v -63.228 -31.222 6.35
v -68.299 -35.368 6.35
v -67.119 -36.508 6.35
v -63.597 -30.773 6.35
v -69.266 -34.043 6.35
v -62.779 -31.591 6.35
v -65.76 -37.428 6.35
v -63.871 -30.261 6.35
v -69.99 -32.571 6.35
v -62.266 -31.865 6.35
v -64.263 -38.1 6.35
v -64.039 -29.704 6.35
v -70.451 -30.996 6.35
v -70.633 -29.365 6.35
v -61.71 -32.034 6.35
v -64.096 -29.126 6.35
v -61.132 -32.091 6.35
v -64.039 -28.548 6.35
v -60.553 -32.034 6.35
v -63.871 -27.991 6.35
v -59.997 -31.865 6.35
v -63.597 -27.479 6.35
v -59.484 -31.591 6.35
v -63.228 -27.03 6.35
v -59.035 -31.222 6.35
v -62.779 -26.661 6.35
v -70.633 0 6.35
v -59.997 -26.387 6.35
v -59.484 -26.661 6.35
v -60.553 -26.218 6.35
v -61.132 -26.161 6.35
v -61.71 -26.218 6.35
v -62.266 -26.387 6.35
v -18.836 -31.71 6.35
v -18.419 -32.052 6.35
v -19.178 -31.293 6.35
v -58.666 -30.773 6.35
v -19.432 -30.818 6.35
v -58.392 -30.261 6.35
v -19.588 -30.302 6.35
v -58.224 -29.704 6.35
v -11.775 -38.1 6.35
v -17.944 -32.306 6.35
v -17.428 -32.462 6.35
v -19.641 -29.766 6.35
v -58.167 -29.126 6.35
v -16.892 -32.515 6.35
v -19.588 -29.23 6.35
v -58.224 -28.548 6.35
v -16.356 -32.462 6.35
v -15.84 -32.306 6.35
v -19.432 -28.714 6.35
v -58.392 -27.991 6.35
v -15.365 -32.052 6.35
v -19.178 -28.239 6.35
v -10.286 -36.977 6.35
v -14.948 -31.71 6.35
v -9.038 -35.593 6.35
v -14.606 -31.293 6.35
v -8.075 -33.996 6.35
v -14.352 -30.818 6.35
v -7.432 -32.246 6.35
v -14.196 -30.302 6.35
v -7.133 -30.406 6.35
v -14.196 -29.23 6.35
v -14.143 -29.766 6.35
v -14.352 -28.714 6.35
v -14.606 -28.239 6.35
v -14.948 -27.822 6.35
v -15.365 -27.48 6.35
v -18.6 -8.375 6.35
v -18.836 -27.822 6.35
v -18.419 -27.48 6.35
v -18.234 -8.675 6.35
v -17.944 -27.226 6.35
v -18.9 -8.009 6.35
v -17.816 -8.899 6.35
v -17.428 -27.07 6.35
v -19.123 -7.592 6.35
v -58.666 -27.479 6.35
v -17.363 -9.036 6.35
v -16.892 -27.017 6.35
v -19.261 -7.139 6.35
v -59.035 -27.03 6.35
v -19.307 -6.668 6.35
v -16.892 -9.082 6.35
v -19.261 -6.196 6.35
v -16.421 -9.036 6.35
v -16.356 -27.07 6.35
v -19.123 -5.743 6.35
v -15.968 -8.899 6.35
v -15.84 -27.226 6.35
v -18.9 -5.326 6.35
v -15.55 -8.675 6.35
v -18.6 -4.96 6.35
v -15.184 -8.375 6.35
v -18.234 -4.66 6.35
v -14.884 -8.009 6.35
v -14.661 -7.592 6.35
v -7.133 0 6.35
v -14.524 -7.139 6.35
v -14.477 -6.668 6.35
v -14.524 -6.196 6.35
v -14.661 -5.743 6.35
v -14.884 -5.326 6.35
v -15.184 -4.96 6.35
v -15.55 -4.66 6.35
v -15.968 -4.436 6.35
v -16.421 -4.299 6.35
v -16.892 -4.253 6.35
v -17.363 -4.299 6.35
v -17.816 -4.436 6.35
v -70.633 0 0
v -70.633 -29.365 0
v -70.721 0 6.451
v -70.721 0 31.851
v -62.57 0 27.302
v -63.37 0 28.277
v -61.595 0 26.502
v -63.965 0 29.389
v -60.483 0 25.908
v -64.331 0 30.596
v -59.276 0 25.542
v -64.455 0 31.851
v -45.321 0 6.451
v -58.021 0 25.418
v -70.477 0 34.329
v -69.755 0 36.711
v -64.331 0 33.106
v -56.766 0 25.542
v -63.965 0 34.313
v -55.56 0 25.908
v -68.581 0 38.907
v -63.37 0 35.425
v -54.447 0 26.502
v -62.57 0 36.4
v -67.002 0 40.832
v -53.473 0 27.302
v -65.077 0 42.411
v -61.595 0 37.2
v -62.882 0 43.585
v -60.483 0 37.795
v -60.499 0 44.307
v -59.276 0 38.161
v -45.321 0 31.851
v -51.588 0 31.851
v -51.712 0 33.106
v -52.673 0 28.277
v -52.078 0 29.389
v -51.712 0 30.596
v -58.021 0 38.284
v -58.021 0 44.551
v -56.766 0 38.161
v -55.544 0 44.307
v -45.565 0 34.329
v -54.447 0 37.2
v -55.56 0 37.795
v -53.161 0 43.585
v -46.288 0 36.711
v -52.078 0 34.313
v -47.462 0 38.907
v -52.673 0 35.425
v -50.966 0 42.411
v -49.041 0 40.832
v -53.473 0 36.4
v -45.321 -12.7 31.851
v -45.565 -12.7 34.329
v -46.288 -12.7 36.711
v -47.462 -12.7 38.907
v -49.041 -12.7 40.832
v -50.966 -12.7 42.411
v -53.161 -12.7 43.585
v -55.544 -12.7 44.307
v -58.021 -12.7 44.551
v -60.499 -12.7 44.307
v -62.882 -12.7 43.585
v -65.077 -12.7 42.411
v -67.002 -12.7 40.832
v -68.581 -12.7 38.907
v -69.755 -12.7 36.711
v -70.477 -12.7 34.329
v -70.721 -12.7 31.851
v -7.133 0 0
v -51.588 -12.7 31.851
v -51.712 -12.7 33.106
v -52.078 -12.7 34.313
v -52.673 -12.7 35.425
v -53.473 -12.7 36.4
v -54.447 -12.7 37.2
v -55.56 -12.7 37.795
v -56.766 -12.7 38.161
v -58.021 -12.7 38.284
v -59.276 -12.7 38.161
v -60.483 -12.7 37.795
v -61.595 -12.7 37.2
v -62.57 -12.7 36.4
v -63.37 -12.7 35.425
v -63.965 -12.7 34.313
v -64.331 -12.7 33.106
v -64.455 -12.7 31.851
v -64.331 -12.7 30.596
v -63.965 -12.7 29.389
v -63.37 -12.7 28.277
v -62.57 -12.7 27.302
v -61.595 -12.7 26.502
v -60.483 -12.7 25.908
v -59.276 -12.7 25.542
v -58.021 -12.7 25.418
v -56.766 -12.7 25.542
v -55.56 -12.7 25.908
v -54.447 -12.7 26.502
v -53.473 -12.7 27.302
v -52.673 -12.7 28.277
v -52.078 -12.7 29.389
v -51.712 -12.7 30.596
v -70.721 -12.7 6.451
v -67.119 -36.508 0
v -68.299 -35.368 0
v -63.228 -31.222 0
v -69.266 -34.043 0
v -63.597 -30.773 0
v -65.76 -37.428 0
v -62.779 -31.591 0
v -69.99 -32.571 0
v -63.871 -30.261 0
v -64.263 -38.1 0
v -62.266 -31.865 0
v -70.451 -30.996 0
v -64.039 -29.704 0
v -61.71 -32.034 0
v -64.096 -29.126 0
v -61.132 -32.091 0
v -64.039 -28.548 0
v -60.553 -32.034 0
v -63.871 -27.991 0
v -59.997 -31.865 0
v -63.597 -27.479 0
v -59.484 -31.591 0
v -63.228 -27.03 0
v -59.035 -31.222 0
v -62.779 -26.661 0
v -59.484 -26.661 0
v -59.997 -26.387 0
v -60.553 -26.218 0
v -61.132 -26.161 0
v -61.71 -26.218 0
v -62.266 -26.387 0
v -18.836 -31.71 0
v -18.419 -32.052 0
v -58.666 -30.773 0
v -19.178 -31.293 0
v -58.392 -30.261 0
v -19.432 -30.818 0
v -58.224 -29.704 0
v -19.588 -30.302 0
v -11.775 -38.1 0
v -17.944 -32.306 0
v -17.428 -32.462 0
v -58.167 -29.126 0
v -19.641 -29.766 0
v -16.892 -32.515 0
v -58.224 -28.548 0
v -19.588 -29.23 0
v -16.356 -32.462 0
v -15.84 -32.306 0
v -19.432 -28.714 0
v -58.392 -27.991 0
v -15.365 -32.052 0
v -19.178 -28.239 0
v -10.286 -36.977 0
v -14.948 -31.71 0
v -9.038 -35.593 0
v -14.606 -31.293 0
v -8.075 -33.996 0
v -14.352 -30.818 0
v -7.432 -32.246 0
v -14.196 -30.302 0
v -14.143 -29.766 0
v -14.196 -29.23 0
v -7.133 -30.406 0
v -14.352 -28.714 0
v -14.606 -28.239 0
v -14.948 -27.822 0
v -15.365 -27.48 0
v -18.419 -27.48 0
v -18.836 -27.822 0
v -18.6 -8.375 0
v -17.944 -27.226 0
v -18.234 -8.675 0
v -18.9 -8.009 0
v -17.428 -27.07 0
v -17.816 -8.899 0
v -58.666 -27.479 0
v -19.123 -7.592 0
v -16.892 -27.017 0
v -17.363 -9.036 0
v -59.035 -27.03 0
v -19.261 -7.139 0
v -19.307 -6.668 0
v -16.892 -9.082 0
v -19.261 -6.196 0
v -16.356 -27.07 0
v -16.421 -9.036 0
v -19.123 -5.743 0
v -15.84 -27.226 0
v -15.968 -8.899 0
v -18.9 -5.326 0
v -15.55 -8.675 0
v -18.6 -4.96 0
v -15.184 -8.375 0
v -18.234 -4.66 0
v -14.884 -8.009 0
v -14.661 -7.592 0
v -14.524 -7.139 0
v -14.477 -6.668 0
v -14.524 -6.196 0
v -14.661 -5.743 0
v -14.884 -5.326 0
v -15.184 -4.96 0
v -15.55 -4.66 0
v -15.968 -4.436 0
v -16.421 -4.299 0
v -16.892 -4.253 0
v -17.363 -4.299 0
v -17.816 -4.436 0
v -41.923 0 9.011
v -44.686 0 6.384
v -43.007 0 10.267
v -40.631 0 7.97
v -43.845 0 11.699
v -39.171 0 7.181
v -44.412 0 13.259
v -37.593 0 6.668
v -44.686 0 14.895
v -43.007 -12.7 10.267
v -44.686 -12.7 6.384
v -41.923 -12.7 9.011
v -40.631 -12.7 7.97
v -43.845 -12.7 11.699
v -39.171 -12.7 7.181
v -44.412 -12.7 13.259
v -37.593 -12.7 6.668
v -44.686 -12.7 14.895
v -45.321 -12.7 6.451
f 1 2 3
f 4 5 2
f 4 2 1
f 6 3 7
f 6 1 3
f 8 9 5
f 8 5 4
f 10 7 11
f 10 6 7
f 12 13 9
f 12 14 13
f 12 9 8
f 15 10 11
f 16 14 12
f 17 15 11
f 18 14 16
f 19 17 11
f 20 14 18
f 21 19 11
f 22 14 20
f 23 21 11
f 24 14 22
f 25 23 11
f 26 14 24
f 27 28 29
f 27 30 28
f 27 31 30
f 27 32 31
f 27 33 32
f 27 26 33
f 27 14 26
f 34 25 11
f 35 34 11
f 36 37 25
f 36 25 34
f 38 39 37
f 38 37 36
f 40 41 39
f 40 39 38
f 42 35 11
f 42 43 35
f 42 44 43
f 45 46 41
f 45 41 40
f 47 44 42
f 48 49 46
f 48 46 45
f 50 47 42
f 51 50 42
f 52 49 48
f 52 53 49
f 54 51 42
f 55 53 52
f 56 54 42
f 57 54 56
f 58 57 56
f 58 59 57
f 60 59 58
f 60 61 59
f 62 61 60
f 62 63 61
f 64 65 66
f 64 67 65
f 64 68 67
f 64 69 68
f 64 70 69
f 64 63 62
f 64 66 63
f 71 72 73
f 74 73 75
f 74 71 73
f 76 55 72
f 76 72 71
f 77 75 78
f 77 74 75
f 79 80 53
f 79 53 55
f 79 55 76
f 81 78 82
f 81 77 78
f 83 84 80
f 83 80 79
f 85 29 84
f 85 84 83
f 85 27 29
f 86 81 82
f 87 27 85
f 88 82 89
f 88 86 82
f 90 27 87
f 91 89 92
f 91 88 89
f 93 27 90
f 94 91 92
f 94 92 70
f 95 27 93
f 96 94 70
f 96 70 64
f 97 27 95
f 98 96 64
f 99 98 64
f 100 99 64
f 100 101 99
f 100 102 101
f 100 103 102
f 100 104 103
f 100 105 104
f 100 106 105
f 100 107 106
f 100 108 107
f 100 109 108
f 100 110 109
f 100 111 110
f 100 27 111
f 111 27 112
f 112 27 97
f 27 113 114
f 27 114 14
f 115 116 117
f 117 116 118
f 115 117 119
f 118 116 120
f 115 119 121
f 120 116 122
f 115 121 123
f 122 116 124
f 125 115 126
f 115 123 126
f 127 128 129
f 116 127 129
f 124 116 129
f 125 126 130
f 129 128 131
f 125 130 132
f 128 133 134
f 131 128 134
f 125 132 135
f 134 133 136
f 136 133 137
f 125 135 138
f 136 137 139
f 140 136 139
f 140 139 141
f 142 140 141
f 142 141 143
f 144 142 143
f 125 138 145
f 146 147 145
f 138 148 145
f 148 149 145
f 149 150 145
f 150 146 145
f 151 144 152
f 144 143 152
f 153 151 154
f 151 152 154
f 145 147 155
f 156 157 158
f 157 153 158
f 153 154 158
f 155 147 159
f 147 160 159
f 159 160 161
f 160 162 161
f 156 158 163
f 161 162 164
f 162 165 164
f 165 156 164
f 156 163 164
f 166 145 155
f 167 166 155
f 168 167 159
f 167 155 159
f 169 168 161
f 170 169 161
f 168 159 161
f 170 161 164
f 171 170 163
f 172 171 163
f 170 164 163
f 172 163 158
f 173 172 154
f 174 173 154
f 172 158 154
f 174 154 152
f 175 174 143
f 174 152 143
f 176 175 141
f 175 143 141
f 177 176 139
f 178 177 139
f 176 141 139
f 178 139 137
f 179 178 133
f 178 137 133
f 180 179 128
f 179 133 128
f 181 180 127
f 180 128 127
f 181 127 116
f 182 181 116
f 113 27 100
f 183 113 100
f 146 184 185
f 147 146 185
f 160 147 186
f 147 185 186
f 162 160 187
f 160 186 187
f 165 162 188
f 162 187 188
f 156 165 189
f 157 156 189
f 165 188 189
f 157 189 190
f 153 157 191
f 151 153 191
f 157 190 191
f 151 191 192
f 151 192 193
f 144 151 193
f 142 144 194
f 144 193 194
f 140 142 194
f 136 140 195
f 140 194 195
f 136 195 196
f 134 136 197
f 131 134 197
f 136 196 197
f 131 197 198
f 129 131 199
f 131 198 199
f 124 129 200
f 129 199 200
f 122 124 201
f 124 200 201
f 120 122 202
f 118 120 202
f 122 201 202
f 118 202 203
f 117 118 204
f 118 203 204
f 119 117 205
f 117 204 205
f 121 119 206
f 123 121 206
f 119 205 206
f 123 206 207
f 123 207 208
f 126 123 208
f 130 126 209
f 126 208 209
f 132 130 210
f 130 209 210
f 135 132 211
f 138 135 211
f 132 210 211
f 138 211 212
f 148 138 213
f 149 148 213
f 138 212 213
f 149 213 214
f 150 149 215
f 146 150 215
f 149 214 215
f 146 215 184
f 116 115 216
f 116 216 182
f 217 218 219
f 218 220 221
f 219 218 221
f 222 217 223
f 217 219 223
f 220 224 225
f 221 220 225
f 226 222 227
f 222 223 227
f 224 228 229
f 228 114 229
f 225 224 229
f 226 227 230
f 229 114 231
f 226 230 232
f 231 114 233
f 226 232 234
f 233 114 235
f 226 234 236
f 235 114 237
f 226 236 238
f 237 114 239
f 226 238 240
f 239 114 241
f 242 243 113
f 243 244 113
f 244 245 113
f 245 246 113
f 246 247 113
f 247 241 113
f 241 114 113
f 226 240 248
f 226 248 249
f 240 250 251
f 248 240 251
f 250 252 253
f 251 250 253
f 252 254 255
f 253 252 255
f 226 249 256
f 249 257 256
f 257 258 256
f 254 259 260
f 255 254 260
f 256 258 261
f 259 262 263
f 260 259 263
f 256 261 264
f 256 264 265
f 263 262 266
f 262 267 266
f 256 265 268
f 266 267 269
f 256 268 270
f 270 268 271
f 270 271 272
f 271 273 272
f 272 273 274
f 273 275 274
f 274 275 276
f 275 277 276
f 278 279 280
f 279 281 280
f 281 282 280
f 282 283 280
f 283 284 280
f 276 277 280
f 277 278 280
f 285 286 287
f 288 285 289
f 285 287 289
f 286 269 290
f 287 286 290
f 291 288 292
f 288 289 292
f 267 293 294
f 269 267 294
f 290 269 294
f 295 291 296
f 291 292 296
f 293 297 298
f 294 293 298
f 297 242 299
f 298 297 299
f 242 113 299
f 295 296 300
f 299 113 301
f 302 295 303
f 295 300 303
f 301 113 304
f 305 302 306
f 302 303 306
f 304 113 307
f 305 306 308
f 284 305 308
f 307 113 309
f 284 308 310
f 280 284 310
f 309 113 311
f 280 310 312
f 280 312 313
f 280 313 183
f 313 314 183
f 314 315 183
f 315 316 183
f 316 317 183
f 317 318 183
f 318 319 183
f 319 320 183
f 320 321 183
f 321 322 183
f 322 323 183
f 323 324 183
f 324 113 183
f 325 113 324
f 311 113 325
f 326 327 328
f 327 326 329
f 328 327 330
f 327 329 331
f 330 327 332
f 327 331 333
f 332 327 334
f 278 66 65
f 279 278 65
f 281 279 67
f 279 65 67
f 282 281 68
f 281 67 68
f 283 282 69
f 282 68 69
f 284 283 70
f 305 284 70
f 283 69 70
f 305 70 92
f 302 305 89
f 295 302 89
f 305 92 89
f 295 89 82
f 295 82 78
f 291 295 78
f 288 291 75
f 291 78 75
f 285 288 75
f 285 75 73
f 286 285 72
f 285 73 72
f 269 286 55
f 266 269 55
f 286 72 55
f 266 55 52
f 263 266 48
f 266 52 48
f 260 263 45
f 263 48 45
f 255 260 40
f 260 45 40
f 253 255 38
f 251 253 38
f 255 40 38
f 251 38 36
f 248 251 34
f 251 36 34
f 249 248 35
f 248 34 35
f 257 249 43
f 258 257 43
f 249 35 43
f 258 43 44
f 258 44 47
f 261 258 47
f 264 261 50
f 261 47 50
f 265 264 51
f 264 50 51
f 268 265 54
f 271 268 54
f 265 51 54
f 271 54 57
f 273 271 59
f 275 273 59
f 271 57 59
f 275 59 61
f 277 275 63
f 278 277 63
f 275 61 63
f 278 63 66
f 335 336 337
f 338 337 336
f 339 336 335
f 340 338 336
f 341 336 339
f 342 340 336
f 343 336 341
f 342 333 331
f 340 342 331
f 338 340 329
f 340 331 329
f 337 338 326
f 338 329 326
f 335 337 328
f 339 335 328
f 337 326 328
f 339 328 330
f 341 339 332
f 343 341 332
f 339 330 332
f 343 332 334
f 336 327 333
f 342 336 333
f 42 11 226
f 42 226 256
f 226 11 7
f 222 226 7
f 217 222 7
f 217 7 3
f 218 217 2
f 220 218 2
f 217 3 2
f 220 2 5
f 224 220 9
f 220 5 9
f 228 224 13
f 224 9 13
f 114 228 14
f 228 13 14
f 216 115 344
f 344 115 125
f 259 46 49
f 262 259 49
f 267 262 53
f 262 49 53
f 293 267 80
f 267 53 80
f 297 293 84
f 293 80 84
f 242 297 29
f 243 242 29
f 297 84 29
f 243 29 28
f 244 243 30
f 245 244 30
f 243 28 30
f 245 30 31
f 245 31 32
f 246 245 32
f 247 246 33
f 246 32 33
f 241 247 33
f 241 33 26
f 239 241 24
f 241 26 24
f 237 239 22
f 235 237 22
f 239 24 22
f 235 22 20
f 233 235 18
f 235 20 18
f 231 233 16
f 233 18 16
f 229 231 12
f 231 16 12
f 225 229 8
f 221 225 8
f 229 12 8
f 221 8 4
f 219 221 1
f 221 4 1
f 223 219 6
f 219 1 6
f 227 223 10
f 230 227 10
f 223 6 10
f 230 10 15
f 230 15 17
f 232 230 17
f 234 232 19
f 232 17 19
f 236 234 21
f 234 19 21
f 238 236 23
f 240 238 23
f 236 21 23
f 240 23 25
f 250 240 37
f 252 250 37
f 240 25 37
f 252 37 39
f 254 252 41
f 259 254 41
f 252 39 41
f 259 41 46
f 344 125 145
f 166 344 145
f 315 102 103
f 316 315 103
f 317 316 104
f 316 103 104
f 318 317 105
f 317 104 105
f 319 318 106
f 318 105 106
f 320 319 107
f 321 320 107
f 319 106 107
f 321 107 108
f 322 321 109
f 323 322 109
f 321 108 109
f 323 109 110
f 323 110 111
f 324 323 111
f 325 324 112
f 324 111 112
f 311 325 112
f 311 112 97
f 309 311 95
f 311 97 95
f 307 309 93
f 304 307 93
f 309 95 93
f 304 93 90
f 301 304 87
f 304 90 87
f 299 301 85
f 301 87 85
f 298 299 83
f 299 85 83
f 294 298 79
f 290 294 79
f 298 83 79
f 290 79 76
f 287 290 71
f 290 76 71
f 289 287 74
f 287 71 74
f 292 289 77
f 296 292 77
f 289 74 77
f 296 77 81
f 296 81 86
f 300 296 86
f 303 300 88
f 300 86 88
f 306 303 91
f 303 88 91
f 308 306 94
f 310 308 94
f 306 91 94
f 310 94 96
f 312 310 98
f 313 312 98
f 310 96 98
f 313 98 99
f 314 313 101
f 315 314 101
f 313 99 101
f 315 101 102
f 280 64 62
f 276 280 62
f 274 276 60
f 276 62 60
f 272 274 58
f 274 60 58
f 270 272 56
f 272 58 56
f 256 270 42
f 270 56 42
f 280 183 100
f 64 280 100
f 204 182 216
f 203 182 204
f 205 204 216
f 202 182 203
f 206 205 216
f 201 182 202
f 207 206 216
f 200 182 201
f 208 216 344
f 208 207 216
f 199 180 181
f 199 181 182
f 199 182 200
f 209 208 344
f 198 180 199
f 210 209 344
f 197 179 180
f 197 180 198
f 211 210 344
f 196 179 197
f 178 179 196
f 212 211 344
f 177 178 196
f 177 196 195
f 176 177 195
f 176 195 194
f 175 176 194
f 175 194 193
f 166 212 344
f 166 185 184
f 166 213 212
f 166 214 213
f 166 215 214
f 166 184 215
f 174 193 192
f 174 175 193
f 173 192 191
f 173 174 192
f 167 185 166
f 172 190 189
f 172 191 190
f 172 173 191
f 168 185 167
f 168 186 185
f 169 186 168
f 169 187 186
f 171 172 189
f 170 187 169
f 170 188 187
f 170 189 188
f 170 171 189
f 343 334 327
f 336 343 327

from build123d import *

# Parameters (mm, degrees)
F0_W      = 63.5
F0_H      = 6.35
F1_DEPTH  = 38.1
F2_W      = 25.4
F2_H      = 25.4
F3_DEPTH  = 12.7
F5_DEPTH  = 12.7
F7_DEPTH  = 6.35
F8_R      = 6.433108
F9_DEPTH  = 12.7
F10_R     = 2.414951
F10_R_2   = 2.749165
F10_R_3   = 2.964845
F11_DEPTH = 6.35


with BuildPart() as f1:
    # F0 (on Front) → F1 (new body)
    with BuildSketch(Plane.XZ):
        with Locations((-38.883258, 3.175)):
            Rectangle(F0_W, F0_H)
    extrude(amount=F1_DEPTH)

    # F6 (on face) → F7 (cut)
    with BuildSketch(Plane.XY.offset(6.35)):
        with BuildLine():
            ThreePointArc((-64.263351, -38.1), (-68.81105, -34.726496), (-70.633258, -29.365372))
            Line((-70.633258, -29.365372), (-70.633258, -38.1))
            Line((-70.633258, -38.1), (-64.263351, -38.1))
        make_face()
        with BuildLine():
            ThreePointArc((-7.133258, -30.40603), (-8.517957, -34.817601), (-11.774521, -38.1))
            Line((-11.774521, -38.1), (-7.133258, -38.1))
            Line((-7.133258, -38.1), (-7.133258, -30.40603))
        make_face()
    extrude(amount=-F7_DEPTH, mode=Mode.SUBTRACT)

    # F10 (on face) → F11 (cut)
    with BuildSketch(Plane.XY.offset(6.35)):
        with Locations((-16.892102, -6.6675)):
            Circle(F10_R)
        with Locations((-16.892102, -29.766033)):
            Circle(F10_R_2)
        with Locations((-61.131514, -29.126037)):
            Circle(F10_R_3)
    extrude(amount=-F11_DEPTH, mode=Mode.SUBTRACT)


with BuildPart() as f3:
    # F2 (on Front) → F3 (new body)
    with BuildSketch(Plane.XZ):
        with BuildLine():
            ThreePointArc((-45.321436, 31.851328), (-58.021436, 44.551328), (-70.721436, 31.851328))
            Line((-70.721436, 31.851328), (-45.321436, 31.851328))
        make_face()
        with Locations((-58.021436, 19.151328)):
            Rectangle(F2_W, F2_H)
    extrude(amount=F3_DEPTH)

    # F8 (on face) → F9 (cut)
    with BuildSketch(Plane.XZ.offset(12.7)):
        with Locations((-58.021436, 31.851328)):
            Circle(F8_R)
    extrude(amount=-F9_DEPTH, mode=Mode.SUBTRACT)


with BuildPart() as f5:
    # F4 (on Front) → F5 (new body)
    with BuildSketch(Plane.XZ):
        with BuildLine():
            ThreePointArc((-37.59335, 6.6675), (-42.493733, 9.614386), (-44.686437, 14.895478))
            Line((-44.686437, 14.895478), (-44.686437, 6.383777))
            Line((-44.686437, 6.383777), (-37.59335, 6.6675))
        make_face()
    extrude(amount=F5_DEPTH)


solid = Compound([f1.part, f3.part, f5.part])
